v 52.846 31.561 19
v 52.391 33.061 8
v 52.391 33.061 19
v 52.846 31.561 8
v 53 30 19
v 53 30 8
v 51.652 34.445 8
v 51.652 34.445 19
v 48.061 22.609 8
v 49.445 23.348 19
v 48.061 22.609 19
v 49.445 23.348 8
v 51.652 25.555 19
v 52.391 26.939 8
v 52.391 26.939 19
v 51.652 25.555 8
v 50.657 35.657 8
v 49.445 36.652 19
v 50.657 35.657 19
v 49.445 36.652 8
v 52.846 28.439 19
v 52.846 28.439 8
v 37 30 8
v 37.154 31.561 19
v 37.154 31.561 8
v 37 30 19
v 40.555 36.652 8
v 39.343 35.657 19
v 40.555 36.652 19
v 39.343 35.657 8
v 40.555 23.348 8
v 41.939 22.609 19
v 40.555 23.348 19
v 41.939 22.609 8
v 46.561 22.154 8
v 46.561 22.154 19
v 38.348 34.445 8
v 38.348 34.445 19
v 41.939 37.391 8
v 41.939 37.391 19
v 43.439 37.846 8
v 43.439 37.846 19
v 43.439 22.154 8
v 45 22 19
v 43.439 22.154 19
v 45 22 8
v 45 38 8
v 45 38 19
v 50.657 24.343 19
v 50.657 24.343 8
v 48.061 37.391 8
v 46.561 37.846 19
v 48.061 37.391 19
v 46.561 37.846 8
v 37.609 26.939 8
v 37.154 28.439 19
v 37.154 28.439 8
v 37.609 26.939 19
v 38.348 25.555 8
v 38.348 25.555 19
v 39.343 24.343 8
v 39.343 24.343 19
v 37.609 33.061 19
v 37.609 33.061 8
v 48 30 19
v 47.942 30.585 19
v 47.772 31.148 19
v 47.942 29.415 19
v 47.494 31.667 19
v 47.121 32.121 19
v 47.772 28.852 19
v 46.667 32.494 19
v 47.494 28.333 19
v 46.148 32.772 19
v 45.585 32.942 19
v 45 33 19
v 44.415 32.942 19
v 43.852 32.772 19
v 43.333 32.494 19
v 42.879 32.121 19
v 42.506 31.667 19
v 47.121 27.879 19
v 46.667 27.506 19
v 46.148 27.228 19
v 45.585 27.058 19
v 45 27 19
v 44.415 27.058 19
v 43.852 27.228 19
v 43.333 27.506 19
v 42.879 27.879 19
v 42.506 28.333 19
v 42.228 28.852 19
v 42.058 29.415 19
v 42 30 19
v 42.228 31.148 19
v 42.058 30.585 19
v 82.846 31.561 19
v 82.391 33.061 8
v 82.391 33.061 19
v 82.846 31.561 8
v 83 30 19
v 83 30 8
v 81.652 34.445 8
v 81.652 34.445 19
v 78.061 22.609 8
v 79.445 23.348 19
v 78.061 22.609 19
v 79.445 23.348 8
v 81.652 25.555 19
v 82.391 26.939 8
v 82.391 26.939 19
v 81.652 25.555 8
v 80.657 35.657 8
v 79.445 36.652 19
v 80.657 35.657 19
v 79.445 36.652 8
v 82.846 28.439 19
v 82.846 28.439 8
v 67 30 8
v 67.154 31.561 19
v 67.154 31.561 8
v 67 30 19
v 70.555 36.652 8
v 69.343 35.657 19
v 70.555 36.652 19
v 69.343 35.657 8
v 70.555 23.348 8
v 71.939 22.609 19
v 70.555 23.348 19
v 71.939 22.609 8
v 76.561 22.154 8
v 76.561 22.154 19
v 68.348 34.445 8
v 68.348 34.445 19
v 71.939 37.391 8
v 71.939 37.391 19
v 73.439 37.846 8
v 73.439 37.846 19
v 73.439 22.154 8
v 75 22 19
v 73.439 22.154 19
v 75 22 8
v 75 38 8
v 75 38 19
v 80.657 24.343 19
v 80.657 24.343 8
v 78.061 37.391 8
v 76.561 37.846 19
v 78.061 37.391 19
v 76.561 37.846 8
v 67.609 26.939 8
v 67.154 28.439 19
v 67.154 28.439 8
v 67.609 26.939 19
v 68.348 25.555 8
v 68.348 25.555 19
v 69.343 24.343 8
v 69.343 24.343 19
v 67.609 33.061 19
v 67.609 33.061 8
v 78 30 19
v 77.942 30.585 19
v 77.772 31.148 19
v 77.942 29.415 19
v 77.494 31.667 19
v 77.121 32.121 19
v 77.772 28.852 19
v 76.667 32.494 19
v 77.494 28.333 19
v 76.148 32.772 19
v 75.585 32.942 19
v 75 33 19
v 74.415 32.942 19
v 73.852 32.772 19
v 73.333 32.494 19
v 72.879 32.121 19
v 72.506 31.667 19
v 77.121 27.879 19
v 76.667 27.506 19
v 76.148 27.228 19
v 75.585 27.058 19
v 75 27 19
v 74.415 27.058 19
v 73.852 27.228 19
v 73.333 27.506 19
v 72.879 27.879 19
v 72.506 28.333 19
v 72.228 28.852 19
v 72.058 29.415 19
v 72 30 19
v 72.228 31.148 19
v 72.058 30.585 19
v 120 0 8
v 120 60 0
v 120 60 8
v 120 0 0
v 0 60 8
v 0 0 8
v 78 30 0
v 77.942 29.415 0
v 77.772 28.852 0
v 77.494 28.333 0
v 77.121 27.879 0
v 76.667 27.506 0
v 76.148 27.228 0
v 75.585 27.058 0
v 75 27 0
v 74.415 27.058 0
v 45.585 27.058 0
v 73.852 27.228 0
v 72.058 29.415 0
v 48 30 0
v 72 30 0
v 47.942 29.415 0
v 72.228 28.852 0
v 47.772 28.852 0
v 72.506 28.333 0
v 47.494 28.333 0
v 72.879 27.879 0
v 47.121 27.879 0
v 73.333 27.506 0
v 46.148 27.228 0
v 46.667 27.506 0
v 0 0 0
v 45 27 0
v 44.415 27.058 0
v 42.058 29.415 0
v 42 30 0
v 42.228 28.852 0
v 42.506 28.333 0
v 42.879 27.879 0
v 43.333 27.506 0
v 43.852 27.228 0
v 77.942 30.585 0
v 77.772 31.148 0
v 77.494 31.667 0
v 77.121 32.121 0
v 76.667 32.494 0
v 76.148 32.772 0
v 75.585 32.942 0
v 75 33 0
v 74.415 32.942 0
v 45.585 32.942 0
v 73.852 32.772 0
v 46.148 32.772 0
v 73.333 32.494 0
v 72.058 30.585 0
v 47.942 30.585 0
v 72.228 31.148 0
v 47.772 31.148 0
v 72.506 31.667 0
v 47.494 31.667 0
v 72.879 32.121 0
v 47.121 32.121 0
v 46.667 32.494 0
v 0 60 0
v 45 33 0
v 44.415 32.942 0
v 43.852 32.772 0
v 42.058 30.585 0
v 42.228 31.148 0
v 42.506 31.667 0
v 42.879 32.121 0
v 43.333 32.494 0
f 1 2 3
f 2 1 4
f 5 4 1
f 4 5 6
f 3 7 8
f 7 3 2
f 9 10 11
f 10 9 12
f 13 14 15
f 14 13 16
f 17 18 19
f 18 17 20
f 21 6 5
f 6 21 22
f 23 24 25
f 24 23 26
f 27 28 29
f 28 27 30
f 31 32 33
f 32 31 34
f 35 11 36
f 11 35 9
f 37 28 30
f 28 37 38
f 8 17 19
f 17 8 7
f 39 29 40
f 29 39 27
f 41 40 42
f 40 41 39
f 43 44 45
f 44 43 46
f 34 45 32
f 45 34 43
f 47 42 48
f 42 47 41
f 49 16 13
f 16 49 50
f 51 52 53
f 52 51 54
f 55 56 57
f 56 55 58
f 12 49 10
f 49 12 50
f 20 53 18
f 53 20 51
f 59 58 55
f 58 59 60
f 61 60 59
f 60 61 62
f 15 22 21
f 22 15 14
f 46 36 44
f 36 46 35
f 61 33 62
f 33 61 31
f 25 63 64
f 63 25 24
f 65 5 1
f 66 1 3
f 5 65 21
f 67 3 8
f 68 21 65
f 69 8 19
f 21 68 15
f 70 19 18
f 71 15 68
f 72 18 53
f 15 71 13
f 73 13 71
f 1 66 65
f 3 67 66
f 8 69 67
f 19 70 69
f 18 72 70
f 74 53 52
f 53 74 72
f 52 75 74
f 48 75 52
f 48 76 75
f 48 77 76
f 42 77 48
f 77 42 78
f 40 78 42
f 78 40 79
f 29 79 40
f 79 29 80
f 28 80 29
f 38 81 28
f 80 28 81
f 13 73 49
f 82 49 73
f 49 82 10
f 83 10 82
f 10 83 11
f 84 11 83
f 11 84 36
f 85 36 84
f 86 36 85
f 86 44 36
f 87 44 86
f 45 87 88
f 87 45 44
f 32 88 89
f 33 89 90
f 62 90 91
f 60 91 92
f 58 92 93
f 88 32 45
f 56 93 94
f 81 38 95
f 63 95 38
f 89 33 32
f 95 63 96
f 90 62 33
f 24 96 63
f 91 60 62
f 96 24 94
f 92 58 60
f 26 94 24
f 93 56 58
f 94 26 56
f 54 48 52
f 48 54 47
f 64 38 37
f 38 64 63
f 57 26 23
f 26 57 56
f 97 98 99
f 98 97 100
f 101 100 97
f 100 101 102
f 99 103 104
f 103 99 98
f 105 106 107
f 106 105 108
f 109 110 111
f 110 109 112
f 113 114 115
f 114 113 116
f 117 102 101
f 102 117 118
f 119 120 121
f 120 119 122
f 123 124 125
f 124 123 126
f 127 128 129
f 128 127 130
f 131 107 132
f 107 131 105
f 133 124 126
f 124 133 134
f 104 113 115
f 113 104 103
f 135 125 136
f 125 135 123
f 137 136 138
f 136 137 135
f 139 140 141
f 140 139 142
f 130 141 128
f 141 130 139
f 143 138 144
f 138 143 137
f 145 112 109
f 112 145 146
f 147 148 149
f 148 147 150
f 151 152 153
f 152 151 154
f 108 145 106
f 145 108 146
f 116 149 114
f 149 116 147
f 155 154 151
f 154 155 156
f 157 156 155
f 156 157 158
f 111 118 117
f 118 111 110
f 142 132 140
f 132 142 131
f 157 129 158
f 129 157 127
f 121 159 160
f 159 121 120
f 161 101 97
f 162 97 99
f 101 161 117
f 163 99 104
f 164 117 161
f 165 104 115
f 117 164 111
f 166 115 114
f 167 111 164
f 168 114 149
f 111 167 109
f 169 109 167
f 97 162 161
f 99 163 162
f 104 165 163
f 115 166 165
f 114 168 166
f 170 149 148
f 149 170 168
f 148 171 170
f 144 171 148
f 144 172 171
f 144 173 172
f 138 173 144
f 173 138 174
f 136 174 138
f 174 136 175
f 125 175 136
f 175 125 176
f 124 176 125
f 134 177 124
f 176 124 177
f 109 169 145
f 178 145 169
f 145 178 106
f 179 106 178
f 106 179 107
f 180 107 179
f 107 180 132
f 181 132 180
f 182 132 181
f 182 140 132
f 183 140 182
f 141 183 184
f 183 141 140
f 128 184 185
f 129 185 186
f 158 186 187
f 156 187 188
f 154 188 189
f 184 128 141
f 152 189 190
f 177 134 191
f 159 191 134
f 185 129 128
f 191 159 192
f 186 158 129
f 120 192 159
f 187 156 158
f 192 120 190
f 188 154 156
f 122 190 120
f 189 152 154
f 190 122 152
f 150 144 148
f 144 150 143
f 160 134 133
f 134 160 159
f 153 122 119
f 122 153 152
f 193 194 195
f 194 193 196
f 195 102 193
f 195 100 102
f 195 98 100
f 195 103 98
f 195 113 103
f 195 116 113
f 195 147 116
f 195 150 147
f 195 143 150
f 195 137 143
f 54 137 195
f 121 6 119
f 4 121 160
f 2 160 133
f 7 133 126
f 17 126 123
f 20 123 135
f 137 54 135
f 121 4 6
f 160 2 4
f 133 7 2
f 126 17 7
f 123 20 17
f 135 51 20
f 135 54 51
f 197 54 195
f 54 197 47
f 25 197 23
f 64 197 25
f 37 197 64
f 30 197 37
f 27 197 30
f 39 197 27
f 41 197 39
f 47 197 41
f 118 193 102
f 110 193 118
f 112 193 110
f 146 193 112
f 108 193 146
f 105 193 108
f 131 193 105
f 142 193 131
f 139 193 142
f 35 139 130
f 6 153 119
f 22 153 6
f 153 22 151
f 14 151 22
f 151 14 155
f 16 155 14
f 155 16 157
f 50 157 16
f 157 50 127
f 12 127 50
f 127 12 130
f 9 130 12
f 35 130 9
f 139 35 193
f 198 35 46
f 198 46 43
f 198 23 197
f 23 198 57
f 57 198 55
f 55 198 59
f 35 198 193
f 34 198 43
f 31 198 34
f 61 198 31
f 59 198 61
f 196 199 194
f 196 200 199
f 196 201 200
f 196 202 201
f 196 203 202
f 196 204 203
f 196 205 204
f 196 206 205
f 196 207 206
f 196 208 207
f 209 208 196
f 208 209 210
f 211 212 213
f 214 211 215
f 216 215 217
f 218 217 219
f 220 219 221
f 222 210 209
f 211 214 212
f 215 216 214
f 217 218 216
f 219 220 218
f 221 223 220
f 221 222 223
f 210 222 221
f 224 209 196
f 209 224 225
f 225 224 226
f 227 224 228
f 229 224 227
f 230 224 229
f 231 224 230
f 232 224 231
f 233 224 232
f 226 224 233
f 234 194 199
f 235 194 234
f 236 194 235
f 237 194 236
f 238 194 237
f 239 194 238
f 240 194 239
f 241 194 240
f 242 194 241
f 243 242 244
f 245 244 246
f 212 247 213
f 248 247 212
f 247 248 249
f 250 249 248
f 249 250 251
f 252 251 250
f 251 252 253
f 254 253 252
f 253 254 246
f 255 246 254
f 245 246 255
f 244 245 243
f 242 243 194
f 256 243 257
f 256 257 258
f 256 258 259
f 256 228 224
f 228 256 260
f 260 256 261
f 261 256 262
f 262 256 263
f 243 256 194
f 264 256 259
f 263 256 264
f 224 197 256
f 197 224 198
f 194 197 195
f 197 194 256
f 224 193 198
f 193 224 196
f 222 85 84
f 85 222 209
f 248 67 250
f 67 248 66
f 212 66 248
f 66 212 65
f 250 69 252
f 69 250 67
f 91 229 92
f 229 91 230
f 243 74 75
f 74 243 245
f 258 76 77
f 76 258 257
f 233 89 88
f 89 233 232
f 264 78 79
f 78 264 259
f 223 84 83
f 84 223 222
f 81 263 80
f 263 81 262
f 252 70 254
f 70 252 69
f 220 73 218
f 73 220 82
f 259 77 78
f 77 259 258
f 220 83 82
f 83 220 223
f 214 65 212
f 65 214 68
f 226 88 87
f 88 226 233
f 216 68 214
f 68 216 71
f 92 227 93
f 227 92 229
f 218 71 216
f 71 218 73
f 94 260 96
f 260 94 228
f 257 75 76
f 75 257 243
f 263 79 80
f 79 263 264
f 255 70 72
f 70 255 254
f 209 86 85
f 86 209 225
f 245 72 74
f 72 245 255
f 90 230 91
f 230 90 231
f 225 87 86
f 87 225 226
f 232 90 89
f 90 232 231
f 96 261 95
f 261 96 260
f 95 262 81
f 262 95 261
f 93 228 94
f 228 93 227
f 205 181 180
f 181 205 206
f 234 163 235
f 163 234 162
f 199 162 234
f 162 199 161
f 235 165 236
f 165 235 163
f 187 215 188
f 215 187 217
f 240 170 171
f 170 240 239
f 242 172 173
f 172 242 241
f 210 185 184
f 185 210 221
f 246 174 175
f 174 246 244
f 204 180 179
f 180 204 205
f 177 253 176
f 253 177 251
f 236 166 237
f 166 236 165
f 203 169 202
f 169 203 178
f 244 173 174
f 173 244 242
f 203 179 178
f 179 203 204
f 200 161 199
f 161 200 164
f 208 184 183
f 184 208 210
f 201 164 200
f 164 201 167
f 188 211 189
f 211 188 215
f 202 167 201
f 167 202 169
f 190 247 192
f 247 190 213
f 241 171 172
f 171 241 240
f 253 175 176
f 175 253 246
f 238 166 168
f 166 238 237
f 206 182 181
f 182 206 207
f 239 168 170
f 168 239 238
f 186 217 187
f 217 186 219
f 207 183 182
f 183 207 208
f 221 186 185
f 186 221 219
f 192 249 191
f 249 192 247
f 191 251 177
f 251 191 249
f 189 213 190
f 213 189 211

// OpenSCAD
$fn = 32;

// ----------------------------------------------------------------------
// Drill jig: two_boss jig
// ----------------------------------------------------------------------

// --- parameters (mm) ---
plate_l = 120;            // plate length, X
plate_w = 60;             // plate width, Y
plate_t = 8;              // plate thickness
boss_d = 16;              // guide boss diameter
boss_h = 12;              // boss height above the plate
guide_d = 6;              // guide hole diameter
boss_pitch = 30;          // boss pitch

n_boss = 2;  // guide bosses
boss_x0 = (plate_l - (n_boss - 1) * boss_pitch) / 2;  // first boss X
boss_top = plate_t - 1 + boss_h;  // boss crown height
total_h = boss_top;  // overall height

difference() {
  union() {
  cube([plate_l, plate_w, plate_t]);
  for (i = [0 : n_boss - 1])
    translate([boss_x0 + i * boss_pitch, plate_w / 2, plate_t - 1])
      cylinder(h = boss_h, d = boss_d);
  }
  for (i = [0 : n_boss - 1])
    translate([boss_x0 + i * boss_pitch, plate_w / 2, -1])
      cylinder(h = plate_t + boss_h, d = guide_d);
}
